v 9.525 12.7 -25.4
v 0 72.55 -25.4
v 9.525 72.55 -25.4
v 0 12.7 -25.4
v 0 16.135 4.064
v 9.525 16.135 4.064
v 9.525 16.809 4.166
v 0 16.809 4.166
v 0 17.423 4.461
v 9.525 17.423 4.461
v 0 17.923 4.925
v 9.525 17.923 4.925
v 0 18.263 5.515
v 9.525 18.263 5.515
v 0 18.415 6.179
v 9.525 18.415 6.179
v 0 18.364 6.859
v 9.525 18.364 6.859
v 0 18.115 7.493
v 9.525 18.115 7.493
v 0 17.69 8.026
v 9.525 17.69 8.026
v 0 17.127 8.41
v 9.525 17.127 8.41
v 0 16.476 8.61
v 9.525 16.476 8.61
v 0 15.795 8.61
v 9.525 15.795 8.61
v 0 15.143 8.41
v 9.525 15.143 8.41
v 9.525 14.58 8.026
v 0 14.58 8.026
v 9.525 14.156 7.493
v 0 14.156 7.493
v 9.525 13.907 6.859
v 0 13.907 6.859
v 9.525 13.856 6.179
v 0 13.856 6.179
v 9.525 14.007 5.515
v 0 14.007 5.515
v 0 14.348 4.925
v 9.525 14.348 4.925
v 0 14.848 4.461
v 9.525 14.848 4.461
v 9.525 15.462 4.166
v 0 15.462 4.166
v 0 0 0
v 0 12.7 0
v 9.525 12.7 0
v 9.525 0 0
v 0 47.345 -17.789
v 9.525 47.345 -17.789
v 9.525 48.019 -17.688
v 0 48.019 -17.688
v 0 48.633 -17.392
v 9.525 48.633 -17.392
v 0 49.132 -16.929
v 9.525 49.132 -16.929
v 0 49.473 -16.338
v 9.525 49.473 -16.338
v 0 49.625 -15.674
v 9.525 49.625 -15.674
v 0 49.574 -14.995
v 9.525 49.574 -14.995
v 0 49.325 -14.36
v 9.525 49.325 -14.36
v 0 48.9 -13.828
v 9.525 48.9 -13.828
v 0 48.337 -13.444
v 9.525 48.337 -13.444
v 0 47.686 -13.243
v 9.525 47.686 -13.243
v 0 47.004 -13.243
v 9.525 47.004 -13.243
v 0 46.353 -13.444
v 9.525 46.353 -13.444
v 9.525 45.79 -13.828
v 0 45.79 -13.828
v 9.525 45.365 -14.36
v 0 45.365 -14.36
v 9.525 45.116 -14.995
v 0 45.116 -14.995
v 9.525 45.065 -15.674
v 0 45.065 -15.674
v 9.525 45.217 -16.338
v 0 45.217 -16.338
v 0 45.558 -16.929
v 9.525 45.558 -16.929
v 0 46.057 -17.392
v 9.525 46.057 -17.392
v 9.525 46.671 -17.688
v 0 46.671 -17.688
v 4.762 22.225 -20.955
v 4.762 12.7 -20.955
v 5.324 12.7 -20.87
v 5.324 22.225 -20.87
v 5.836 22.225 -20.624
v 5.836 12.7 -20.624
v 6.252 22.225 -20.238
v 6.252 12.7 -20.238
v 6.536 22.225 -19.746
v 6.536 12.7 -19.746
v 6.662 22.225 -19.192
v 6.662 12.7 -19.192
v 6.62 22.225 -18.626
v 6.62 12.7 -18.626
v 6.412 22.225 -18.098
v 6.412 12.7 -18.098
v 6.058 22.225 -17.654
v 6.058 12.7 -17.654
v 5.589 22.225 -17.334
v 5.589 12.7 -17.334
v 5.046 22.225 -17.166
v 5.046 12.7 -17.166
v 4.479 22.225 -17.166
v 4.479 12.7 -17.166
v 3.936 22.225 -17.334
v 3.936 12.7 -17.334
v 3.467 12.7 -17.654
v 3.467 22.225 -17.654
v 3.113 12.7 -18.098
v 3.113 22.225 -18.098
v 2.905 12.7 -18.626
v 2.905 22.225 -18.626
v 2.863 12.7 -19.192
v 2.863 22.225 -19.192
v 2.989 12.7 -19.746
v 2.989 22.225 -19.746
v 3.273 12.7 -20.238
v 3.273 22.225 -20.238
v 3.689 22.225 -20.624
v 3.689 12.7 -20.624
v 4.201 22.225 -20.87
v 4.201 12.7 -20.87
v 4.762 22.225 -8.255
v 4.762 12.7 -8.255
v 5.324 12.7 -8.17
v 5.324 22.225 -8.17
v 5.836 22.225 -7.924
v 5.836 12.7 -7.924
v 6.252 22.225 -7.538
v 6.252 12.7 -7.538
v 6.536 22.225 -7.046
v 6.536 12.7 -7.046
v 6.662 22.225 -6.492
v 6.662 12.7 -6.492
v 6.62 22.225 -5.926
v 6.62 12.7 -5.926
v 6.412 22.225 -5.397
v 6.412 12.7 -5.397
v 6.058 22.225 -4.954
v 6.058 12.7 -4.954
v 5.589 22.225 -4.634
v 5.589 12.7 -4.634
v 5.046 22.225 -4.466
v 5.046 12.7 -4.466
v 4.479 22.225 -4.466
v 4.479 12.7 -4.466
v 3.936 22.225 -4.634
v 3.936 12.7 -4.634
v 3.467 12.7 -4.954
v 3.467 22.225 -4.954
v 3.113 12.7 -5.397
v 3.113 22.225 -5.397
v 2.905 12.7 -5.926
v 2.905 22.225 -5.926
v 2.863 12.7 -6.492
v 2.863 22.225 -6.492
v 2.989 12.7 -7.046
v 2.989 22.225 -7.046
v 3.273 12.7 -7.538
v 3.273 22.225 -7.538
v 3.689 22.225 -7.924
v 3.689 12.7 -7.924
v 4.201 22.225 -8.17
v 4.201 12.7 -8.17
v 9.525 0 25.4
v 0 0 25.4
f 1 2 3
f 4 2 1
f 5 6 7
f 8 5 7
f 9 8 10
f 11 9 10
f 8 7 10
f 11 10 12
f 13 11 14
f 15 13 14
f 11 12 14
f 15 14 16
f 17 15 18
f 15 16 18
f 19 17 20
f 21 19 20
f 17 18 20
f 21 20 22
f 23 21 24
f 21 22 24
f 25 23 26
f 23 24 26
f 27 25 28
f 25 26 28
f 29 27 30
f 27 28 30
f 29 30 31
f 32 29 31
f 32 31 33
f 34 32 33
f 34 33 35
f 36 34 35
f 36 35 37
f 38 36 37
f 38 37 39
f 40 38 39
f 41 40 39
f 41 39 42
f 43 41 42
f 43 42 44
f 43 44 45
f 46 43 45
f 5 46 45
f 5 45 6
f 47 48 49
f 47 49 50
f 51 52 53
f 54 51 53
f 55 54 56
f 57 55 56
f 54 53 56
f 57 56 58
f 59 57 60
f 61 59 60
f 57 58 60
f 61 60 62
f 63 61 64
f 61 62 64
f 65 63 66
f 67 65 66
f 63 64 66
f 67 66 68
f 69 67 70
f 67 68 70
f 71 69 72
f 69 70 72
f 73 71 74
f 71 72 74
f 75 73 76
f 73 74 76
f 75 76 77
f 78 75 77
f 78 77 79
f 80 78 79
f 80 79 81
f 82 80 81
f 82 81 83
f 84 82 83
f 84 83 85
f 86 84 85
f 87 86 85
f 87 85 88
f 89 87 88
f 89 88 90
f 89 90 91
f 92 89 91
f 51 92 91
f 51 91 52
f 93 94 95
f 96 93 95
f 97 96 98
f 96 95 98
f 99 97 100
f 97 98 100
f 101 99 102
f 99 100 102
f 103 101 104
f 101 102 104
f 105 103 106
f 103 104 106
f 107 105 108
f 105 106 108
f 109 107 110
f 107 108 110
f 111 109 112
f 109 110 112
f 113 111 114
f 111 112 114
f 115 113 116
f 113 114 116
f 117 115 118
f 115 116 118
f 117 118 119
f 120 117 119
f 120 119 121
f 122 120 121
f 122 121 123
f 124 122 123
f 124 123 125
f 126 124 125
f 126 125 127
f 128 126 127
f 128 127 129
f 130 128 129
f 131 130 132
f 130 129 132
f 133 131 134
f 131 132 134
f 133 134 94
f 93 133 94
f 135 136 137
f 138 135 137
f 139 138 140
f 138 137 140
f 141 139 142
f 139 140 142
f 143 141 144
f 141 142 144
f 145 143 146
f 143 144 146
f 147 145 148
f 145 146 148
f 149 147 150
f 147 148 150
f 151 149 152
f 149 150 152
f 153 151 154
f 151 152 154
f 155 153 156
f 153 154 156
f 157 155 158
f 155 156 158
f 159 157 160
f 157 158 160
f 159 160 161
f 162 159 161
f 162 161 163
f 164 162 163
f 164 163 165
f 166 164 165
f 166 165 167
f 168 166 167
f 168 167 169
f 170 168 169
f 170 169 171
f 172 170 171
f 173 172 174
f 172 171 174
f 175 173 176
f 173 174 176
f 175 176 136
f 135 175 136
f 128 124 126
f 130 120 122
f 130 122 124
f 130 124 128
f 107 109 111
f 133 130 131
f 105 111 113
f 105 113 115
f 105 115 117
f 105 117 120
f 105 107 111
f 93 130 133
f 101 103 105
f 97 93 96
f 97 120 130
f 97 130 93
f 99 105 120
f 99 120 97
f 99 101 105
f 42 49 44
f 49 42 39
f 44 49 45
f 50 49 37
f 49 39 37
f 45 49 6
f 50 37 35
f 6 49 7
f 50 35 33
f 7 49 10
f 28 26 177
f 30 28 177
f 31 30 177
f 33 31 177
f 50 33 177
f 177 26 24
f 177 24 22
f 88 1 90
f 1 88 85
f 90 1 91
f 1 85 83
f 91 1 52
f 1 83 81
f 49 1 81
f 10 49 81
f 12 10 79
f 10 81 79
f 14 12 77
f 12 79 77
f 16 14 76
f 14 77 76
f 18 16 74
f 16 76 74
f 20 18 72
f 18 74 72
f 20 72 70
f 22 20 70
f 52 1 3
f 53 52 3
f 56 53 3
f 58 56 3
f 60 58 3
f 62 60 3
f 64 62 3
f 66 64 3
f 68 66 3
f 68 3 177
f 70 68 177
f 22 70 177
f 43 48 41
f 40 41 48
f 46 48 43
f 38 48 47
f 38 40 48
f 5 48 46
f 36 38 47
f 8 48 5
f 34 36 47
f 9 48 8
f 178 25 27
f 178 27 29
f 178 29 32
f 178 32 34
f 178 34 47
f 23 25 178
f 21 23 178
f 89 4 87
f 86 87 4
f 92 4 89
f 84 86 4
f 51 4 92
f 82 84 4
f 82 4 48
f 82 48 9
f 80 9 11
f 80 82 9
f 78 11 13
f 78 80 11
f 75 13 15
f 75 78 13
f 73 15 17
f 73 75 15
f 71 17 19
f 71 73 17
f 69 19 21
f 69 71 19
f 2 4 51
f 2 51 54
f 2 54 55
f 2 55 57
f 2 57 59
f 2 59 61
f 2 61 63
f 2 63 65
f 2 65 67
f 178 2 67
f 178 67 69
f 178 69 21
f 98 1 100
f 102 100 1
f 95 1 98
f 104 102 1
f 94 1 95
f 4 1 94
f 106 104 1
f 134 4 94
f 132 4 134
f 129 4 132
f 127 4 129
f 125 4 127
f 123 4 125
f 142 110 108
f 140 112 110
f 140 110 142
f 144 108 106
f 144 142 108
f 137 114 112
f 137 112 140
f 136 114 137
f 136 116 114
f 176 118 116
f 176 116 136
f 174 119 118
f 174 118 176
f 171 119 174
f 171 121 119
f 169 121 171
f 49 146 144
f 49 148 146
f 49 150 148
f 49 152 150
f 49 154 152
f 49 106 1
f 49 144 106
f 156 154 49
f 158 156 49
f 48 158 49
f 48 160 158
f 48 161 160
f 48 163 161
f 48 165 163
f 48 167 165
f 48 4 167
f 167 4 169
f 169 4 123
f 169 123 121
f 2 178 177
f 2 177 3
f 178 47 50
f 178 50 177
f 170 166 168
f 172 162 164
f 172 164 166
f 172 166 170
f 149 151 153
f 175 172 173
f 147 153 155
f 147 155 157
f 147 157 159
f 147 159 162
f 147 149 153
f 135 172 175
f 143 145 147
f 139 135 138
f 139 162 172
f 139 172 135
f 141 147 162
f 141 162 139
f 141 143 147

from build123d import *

# Parameters (mm, degrees)
BOSS_EXTRUDE1_DEPTH = 9.525
SKETCH2_R           = 1.905
CUT_EXTRUDE1_DEPTH  = 9.525
SKETCH3_R           = 2.286
CUT_EXTRUDE2_DEPTH  = 78.455641076


with BuildPart() as part:
    # Sketch1 → Boss-Extrude1 (new body)
    with BuildSketch(Plane(origin=(0, 0, 0), x_dir=(0, 0, -1), z_dir=(1, 0, 0))):
        Polygon((0, 0), (-25.4, 0), (25.4, 72.549918742), (25.4, 12.7), (0, 12.7), align=None)
    extrude(amount=BOSS_EXTRUDE1_DEPTH)

    # Sketch2 → Cut-Extrude1 (cut)
    with BuildSketch(Plane.XZ.offset(-12.7)):
        with Locations(Location((4.7625, -19.05, 0), (0, 0, 270))):
            Circle(SKETCH2_R)
        with Locations(Location((4.7625, -6.35, 0), (0, 0, 270))):
            Circle(SKETCH2_R)
    extrude(amount=-CUT_EXTRUDE1_DEPTH, mode=Mode.SUBTRACT)

    # Sketch3 → Cut-Extrude2 (cut, through all)
    with BuildSketch(Plane(origin=(9.525, 0, 0), x_dir=(0, 0, -1), z_dir=(1, 0, 0))):
        with Locations((-6.35, 16.135332376)):
            Circle(SKETCH3_R)
        with Locations((15.503262225, 47.345025264)):
            Circle(SKETCH3_R)
    extrude(amount=-CUT_EXTRUDE2_DEPTH, mode=Mode.SUBTRACT)


solid = part.part
